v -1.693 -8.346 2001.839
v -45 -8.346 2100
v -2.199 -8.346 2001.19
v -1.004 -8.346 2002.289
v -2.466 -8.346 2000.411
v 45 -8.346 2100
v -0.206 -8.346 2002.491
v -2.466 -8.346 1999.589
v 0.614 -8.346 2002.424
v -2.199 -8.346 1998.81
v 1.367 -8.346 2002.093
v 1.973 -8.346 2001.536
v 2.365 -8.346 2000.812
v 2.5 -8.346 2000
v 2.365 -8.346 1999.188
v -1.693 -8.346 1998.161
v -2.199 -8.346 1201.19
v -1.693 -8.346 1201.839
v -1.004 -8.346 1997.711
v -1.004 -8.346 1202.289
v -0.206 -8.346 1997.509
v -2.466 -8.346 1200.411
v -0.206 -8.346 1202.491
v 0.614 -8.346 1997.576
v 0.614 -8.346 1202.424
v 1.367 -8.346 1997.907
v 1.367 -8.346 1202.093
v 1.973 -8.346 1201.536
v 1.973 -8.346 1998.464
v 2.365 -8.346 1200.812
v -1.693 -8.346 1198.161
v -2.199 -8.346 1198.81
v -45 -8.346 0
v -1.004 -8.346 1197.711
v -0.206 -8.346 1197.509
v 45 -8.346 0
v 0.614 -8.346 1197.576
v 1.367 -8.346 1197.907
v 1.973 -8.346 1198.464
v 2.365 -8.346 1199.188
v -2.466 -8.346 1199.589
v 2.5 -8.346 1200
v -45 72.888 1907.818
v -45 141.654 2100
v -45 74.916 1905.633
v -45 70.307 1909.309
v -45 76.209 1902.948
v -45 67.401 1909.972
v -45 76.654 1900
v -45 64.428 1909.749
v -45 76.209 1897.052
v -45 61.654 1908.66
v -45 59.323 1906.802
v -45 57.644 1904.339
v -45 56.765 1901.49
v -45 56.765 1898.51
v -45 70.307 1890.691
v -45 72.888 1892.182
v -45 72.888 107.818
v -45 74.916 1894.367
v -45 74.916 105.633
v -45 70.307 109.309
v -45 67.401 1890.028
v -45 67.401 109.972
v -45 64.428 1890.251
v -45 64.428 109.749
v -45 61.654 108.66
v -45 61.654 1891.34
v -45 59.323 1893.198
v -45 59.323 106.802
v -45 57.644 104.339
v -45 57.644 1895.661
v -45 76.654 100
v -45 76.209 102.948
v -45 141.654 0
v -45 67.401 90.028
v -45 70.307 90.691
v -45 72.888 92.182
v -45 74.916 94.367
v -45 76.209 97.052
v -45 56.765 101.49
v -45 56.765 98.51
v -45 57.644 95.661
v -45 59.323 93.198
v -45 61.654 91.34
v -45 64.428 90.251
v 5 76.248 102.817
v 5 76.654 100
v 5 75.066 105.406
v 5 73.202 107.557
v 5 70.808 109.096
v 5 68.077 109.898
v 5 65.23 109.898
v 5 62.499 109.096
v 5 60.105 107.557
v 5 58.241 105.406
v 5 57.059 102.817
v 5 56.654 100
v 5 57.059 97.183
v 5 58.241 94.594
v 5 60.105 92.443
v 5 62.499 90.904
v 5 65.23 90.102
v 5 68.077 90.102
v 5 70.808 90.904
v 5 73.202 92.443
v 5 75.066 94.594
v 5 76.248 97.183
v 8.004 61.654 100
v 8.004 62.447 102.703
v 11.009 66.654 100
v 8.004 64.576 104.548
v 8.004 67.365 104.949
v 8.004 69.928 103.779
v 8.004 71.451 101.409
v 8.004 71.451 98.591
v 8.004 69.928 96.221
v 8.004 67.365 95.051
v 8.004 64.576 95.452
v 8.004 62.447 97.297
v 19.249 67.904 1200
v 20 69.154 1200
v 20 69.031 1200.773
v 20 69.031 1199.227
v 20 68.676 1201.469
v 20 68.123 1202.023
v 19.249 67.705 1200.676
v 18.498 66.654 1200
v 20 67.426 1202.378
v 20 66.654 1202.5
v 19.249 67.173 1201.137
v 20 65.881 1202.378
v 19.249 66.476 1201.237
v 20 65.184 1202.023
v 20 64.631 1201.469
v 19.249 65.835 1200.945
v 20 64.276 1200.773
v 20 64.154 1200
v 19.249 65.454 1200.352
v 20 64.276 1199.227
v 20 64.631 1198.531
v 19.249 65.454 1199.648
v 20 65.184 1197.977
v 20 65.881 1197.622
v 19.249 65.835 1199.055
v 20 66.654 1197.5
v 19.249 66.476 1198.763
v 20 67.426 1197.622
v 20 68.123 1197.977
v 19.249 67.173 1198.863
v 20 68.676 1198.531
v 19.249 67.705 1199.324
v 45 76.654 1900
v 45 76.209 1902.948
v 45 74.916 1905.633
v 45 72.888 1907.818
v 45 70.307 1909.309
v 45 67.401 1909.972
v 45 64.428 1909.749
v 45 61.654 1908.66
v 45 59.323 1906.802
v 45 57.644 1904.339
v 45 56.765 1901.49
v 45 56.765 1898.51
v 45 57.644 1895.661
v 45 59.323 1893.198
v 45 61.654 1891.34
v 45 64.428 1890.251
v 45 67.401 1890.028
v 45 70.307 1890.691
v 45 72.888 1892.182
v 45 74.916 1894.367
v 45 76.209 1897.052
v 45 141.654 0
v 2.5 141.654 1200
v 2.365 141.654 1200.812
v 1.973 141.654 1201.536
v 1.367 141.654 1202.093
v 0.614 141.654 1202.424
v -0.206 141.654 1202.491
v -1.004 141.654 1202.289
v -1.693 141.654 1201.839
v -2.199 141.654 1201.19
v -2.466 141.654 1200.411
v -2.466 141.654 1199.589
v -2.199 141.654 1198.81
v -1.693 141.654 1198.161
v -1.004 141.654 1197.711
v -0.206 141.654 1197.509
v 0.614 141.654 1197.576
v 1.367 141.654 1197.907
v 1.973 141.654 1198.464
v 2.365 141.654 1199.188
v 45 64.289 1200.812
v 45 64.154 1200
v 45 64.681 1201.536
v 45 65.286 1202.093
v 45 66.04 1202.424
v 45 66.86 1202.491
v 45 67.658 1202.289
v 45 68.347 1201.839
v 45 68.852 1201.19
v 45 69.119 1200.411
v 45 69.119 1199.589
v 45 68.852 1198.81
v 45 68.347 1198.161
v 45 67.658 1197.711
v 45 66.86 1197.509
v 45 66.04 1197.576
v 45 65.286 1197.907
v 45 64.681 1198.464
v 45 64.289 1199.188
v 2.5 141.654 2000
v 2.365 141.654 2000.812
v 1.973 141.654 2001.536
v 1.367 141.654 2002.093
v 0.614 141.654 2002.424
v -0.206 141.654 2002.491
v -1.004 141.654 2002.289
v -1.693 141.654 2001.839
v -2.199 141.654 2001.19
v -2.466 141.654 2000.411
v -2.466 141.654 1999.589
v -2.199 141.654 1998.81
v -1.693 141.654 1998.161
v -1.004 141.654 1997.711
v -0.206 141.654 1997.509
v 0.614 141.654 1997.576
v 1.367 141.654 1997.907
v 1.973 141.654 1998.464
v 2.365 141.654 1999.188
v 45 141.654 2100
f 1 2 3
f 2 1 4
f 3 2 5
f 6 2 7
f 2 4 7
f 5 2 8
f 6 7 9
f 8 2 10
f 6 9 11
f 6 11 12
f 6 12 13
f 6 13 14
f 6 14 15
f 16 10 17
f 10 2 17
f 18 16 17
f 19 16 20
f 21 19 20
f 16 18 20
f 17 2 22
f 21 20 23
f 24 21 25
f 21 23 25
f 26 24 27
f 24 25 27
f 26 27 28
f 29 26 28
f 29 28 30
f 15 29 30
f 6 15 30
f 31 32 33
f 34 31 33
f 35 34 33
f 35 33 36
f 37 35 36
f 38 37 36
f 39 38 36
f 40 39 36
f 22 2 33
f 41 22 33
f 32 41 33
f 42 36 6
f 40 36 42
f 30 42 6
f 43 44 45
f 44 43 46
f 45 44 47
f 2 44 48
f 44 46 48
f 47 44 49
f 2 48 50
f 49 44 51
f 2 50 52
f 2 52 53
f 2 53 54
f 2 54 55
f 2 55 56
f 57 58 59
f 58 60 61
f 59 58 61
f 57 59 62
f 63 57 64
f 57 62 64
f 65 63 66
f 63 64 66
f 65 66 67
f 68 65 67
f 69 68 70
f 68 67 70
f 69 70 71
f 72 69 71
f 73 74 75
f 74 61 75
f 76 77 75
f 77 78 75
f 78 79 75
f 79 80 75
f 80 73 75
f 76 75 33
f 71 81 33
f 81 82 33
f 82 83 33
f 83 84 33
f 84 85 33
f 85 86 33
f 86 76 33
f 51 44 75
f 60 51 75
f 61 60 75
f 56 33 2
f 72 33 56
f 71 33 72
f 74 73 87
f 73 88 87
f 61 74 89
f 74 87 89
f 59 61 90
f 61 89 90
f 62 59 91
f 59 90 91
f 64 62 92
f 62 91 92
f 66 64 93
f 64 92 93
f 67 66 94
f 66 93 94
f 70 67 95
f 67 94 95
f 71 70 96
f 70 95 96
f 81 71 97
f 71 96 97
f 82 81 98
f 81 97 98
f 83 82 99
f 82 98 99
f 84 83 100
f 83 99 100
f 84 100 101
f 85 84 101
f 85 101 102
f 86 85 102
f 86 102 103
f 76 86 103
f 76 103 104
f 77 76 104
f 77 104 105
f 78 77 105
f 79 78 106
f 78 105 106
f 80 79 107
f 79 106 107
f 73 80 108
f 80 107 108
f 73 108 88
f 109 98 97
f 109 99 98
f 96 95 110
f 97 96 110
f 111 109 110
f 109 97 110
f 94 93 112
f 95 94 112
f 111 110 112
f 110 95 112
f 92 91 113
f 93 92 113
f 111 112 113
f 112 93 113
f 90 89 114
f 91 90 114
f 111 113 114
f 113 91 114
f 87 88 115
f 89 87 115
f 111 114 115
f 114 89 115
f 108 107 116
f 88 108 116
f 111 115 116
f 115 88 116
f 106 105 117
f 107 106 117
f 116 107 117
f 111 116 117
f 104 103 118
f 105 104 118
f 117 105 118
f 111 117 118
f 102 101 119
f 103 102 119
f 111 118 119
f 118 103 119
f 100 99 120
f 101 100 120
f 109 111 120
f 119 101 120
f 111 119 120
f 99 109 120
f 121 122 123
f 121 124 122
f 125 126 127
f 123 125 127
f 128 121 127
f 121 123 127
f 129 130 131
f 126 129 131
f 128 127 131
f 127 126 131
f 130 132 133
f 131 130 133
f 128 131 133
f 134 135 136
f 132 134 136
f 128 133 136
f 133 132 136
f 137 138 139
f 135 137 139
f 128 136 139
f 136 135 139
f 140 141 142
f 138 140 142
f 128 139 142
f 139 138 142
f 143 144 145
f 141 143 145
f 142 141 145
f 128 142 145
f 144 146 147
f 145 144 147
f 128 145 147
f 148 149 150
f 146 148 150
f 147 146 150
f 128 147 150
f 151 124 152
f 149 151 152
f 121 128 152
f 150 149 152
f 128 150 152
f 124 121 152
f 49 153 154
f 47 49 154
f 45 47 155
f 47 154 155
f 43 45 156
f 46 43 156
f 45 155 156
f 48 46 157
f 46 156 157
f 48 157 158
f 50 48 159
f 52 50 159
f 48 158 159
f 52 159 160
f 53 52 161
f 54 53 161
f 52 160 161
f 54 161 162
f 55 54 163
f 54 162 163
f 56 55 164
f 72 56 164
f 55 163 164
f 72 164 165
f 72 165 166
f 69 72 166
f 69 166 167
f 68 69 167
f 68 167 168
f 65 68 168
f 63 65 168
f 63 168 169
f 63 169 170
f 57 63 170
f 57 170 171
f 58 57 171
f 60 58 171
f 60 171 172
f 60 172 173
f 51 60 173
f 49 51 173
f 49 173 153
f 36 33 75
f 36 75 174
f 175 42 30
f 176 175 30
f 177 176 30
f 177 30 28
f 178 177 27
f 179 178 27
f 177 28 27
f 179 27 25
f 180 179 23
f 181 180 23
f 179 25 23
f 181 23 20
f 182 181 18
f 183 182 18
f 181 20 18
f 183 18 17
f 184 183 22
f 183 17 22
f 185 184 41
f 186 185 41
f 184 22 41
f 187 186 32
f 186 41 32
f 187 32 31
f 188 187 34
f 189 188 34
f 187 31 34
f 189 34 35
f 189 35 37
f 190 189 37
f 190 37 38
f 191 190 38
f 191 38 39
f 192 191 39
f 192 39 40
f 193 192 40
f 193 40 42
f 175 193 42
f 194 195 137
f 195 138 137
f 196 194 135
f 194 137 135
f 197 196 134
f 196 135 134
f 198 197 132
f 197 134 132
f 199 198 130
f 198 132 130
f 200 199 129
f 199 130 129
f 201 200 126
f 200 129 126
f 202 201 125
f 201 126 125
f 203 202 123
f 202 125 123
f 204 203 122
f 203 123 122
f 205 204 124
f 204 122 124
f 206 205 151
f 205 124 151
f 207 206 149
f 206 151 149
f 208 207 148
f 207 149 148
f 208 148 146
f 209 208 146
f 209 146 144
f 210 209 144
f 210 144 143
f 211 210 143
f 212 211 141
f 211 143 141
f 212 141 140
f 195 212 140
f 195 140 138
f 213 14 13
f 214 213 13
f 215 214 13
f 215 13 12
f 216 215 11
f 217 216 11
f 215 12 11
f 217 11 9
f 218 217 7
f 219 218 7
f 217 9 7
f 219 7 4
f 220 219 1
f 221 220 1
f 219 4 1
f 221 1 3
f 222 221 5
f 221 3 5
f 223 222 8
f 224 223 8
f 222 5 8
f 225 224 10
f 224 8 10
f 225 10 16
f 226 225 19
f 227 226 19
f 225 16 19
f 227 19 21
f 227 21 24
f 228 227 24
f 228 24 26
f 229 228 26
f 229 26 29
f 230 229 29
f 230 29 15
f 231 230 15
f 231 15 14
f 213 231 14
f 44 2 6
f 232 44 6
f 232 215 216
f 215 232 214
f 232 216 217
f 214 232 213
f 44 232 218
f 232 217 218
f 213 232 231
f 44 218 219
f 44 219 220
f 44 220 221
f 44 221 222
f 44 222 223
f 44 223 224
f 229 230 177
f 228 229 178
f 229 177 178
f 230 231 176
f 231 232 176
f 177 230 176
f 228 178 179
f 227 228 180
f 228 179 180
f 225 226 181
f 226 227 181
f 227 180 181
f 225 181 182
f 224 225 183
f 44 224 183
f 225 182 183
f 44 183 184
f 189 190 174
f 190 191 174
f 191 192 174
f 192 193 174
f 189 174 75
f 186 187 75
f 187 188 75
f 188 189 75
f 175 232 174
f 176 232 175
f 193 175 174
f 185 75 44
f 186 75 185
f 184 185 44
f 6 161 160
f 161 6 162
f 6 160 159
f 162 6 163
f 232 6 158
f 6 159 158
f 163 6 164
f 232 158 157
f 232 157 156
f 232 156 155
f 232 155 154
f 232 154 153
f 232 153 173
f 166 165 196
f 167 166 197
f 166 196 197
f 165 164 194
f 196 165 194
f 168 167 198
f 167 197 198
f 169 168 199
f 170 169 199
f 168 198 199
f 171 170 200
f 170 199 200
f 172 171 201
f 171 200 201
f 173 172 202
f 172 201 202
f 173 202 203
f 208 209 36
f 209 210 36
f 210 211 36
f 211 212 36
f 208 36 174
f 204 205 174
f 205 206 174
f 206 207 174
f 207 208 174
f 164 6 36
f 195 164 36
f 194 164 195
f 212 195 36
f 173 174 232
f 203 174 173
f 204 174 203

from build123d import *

# Parameters (mm, degrees)
F1_DEPTH = 2100
F3_D     = 5
F3_DEPTH = 25
F3_TIP   = 1.5021515476
F5_D     = 5
F6_D     = 5
F8_D     = 20
F9_D     = 20
F9_DEPTH = 50
F9_TIP   = 6.0086061903


with BuildPart() as f1:
    # F0 (on Top) → F1 (new body)
    with BuildSketch(Plane.XY):
        Polygon((-34.2555230263, 141.6535690603), (-45, 141.6535690603), (-45, -8.3464309397), (45, -8.3464309397), (45, 141.6535690603), (34.2555230263, 141.6535690603), align=None)
    extrude(amount=F1_DEPTH)

    # F3
    with Locations(Plane.YZ.offset(45)):
        with Locations((66.6535690603, 1200)):
            Hole(F3_D / 2, depth=F3_DEPTH)
            with Locations((0, 0, -(F3_DEPTH + F3_TIP / 2))):  # 118° drill point
                Cone(0, F3_D / 2, F3_TIP, mode=Mode.SUBTRACT)

    # F5 (through all)
    with Locations(Plane(origin=(0, 141.6535690603, 0), x_dir=(-1, 0, 0), z_dir=(0, 1, 0))):
        with Locations((0, 2000)):
            Hole(F5_D / 2)

    # F6 (through all)
    with Locations(Plane(origin=(0, 141.6535690603, 0), x_dir=(-1, 0, 0), z_dir=(0, 1, 0))):
        with Locations((0, 1200)):
            Hole(F6_D / 2)

    # F8 (through all)
    with Locations(Plane(origin=(-45, 0, 0), x_dir=(0, -1, 0), z_dir=(-1, 0, 0))):
        with Locations((-66.6535690603, 1900)):
            Hole(F8_D / 2)

    # F9
    with Locations(Plane(origin=(-45, 0, 0), x_dir=(0, -1, 0), z_dir=(-1, 0, 0))):
        with Locations((-66.6535690603, 100)):
            Hole(F9_D / 2, depth=F9_DEPTH)
            with Locations((0, 0, -(F9_DEPTH + F9_TIP / 2))):  # 118° drill point
                Cone(0, F9_D / 2, F9_TIP, mode=Mode.SUBTRACT)


solid = f1.part
